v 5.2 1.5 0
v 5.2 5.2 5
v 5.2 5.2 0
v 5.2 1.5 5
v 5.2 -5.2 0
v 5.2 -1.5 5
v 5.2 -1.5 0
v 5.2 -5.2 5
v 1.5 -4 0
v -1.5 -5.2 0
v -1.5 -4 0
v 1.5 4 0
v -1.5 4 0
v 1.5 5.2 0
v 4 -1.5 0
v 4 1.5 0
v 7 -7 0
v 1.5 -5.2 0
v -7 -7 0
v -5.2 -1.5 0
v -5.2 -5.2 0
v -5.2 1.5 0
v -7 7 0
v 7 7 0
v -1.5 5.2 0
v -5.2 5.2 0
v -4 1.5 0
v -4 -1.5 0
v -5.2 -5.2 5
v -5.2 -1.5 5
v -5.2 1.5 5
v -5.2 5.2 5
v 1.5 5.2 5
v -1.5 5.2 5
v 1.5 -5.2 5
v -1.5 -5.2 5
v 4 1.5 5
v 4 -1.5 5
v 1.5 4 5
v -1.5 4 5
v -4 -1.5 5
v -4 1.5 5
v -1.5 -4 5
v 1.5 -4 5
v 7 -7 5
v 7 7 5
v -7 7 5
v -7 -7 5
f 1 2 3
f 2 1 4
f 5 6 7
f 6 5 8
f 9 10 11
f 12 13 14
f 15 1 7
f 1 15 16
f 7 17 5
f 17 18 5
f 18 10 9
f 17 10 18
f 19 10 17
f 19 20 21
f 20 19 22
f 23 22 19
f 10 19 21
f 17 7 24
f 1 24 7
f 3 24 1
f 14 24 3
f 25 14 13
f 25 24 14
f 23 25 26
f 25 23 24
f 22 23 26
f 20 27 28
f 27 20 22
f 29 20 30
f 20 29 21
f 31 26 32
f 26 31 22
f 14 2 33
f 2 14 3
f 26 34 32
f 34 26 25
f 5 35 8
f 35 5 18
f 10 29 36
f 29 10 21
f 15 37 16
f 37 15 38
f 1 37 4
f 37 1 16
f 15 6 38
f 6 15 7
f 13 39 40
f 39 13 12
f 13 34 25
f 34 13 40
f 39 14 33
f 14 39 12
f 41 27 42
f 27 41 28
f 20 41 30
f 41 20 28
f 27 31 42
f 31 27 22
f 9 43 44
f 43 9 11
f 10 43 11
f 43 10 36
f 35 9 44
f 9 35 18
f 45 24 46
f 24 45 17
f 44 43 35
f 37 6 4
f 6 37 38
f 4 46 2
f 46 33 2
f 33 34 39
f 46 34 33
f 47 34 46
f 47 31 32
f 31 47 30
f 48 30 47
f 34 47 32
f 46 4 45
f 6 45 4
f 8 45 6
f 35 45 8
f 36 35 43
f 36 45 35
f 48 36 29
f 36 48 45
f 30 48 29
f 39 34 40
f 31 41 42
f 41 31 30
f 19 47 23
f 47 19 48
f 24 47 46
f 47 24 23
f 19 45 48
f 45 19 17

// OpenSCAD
difference() {
  translate([-7,-7,0]) { cube([14,14,5]); }

  difference() {
    translate([-5.2,-5.2,0]) { cube([10.4,10.4,20]); }
    
    translate([4,-1.5,0]) { cube([3,3,20]); }
    rotate(90) { translate([4,-1.5,0]) { cube([3,3,20]); } }
    rotate(180) { translate([4,-1.5,0]) { cube([3,3,20]); } }
    rotate(270) { translate([4,-1.5,0]) { cube([3,3,20]); } }
  }
}
